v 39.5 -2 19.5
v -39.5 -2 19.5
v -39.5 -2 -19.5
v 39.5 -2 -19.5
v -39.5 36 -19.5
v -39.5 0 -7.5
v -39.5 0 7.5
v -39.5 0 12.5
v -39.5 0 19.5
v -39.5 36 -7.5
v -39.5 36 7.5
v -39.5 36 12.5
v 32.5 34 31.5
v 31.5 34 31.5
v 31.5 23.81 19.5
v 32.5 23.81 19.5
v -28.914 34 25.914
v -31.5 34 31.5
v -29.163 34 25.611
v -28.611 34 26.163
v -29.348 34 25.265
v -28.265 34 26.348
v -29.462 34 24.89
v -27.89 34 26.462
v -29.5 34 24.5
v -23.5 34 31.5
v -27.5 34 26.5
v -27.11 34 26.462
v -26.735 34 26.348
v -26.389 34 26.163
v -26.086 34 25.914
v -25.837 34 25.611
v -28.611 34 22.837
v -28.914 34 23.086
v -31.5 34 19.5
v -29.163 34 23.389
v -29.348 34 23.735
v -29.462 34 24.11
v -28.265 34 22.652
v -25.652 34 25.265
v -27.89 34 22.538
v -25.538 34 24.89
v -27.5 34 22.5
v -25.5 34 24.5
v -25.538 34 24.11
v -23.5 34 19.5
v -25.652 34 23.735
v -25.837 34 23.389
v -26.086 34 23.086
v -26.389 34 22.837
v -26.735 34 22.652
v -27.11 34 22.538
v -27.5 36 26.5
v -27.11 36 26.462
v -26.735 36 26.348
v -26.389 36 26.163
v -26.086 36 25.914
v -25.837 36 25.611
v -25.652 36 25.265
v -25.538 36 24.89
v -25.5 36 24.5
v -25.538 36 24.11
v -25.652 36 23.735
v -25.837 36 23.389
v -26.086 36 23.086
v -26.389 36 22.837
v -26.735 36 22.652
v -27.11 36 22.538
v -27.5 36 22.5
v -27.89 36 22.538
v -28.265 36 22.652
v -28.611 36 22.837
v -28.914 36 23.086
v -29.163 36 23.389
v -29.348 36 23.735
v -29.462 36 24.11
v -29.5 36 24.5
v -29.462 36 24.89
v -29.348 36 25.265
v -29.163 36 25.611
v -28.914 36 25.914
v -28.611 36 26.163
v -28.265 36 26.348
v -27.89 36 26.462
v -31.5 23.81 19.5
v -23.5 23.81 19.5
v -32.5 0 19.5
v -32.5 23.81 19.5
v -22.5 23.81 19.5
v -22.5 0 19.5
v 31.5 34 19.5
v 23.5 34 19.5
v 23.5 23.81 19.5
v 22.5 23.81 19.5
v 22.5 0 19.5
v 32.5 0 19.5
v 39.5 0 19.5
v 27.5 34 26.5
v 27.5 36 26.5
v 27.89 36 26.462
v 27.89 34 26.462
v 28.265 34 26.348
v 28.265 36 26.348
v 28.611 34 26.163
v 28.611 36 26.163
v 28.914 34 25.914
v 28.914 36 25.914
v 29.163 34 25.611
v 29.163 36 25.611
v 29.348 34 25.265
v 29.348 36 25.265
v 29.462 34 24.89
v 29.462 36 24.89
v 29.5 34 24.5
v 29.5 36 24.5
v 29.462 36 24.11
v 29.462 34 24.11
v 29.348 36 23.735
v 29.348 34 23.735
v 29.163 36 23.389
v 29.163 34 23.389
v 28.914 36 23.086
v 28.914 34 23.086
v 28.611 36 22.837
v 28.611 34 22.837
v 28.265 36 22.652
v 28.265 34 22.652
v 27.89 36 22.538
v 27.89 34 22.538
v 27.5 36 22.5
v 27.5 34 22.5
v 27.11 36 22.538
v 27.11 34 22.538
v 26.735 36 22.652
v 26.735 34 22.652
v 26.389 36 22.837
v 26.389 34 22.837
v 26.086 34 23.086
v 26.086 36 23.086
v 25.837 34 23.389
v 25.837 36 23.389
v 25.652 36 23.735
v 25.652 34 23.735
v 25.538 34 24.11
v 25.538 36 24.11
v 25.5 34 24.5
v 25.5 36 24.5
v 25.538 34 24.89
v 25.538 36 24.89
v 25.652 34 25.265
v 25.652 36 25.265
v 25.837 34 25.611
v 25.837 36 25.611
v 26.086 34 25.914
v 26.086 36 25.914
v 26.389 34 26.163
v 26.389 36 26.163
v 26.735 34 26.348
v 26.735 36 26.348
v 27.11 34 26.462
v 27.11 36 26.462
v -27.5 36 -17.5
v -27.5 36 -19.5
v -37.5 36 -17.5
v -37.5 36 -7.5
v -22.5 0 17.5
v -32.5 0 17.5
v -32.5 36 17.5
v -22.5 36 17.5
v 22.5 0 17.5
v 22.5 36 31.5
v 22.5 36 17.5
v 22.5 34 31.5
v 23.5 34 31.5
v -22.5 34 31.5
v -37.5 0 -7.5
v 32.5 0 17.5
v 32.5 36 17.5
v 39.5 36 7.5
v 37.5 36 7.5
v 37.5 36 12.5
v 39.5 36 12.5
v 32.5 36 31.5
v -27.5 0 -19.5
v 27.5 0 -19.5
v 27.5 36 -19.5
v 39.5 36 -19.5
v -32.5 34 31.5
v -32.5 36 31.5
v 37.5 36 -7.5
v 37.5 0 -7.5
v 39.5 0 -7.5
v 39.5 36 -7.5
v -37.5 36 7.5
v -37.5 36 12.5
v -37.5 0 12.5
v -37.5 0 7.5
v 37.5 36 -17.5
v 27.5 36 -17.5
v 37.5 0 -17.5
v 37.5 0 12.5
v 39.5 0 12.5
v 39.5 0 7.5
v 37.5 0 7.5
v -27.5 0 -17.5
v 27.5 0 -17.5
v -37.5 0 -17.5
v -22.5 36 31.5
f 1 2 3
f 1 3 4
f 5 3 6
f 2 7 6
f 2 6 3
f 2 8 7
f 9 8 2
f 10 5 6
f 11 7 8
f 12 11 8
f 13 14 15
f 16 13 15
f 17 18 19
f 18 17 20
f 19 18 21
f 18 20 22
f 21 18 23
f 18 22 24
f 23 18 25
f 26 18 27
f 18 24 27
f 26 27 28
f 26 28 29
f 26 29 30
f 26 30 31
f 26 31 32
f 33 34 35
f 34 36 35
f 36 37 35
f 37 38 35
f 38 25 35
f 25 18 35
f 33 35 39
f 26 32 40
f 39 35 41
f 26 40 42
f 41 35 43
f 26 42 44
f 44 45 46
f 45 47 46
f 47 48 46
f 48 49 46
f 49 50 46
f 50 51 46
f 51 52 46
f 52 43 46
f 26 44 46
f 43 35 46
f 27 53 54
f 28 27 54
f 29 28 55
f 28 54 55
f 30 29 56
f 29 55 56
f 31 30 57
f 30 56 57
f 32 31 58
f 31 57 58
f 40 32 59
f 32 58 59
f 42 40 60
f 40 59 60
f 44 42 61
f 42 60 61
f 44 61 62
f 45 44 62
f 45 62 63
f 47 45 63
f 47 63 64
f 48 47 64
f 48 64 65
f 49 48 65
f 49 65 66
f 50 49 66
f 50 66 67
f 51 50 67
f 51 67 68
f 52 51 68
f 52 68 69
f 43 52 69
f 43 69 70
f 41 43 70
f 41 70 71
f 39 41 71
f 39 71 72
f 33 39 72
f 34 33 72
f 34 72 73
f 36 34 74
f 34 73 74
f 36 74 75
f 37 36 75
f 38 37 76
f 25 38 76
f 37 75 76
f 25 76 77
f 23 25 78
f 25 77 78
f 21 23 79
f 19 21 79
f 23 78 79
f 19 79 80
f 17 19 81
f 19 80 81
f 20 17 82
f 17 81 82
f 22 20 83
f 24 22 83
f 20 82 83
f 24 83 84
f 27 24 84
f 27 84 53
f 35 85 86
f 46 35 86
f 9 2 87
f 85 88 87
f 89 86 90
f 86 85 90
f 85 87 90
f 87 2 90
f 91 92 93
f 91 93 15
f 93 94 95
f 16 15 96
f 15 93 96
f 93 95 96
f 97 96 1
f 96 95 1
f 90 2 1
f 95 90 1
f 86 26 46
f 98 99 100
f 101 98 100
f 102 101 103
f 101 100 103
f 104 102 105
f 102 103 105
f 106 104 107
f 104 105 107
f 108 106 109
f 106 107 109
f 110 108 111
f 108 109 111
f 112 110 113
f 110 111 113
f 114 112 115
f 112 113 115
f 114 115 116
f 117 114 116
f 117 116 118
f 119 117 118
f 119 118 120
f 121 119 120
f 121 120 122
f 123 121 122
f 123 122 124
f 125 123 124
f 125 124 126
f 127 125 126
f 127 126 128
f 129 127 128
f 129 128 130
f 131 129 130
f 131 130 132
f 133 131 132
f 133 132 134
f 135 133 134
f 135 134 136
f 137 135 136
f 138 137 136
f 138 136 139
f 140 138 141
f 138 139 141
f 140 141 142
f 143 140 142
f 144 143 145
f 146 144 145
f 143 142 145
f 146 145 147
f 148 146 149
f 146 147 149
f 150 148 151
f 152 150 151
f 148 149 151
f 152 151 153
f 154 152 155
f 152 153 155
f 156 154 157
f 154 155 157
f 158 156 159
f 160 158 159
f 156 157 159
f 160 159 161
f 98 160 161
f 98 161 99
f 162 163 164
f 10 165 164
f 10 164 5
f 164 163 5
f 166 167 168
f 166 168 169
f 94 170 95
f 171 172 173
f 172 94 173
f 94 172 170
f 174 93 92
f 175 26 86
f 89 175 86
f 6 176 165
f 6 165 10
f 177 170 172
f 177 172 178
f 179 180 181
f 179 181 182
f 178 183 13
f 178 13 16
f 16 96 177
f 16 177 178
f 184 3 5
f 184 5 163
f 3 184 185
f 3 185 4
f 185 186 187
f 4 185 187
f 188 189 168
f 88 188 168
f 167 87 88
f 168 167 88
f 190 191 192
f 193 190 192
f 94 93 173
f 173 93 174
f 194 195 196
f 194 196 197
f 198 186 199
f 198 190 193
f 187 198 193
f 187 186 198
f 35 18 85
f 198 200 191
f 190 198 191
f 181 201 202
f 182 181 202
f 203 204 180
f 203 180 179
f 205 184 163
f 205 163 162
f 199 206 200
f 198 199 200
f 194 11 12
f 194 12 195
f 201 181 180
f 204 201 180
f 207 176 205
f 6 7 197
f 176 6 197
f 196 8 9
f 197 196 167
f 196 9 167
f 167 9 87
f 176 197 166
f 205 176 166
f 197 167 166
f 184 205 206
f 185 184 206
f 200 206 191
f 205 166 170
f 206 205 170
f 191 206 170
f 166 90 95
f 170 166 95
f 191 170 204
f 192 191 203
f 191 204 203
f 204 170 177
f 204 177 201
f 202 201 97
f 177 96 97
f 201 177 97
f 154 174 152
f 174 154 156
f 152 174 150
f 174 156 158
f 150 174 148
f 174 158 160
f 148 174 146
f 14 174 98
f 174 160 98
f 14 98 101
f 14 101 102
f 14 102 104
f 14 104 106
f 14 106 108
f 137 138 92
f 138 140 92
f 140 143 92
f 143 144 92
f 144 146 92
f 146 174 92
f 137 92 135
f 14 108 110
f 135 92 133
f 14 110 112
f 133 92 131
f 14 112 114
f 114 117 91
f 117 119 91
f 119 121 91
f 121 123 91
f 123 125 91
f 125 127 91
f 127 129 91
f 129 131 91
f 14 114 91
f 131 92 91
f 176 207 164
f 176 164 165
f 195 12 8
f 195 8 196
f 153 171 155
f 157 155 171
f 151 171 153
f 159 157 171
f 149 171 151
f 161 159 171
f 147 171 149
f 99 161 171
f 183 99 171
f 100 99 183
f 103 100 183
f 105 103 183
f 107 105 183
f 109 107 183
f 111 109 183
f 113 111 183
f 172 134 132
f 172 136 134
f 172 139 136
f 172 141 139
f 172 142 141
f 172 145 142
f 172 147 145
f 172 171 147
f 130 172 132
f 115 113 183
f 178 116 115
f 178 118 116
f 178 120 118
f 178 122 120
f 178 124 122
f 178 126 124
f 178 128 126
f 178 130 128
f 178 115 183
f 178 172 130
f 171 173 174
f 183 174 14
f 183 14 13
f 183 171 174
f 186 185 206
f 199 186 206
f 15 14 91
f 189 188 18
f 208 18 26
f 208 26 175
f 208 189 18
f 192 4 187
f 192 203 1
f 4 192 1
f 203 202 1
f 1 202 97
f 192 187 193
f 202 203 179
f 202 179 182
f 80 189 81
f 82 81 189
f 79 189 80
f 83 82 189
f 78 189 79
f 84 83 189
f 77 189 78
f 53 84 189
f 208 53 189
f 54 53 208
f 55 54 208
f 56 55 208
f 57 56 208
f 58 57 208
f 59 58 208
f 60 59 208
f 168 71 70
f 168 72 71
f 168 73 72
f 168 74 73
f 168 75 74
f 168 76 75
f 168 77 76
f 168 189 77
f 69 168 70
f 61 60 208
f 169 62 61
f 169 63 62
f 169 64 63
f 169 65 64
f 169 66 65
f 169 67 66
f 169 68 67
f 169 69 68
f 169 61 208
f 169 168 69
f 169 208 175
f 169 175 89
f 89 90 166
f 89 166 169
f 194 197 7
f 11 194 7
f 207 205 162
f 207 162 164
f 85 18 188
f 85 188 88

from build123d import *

# Parameters (mm, degrees)
CROQUIS1_W                = 5
CROQUIS1_H                = 2
SALIENTE_EXTRUIR1_DEPTH   = 36
CROQUIS1_W_2              = 2
CROQUIS1_H_2              = 5
SALIENTE_EXTRUIR1_2_DEPTH = 36
SALIENTE_EXTRUIR1_3_DEPTH = 36
SALIENTE_EXTRUIR1_4_DEPTH = 36
SALIENTE_EXTRUIR1_5_DEPTH = 36
CROQUIS2_W                = 79
CROQUIS2_H                = 39
SALIENTE_EXTRUIR2_DEPTH   = 2
CORTAR_EXTRUIR1_DEPTH     = 36
CROQUIS4_W                = 5
CROQUIS4_H                = 2
SALIENTE_EXTRUIR3_DEPTH   = 36
CROQUIS5_W                = 10
CROQUIS5_H                = 2
SALIENTE_EXTRUIR4_DEPTH   = 12
NERVIO1_REACH             = 88.442
CROQUIS8_WALL_W           = 190.62700295
CROQUIS8_WALL_H           = 1
NERVIO2_REACH             = 80.309
CROQUIS9_WALL_W           = 174.36001667
CROQUIS9_WALL_H           = 1
NERVIO3_REACH             = 88.442
CROQUIS10_WALL_W          = 190.62700295
CROQUIS10_WALL_H          = 1
NERVIO4_REACH             = 80.309
CROQUIS11_WALL_W          = 174.36001667
CROQUIS11_WALL_H          = 1
CROQUIS12_R               = 2
CORTAR_EXTRUIR2_DEPTH     = 64.217877218


with BuildPart() as part:
    # Croquis1 → Saliente-Extruir1 (new body)
    with BuildSketch(Plane(origin=(0, 0, 0), x_dir=(1, 0, 0), z_dir=(0, 1, 0))):
        with Locations((30, -18.5)):
            Rectangle(CROQUIS1_W, CROQUIS1_H)
    extrude(amount=SALIENTE_EXTRUIR1_DEPTH)



with BuildPart() as body_2:
    # Croquis1 → Saliente-Extruir1 2 (new body)
    with BuildSketch(Plane(origin=(0, 0, 0), x_dir=(1, 0, 0), z_dir=(0, 1, 0))):
        with Locations((38.5, -10)):
            Rectangle(CROQUIS1_W_2, CROQUIS1_H_2)
    extrude(amount=SALIENTE_EXTRUIR1_2_DEPTH)


with BuildPart() as body_3:
    # Croquis1 → Saliente-Extruir1 3 (new body)
    with BuildSketch(Plane(origin=(0, 0, 0), x_dir=(1, 0, 0), z_dir=(0, 1, 0))):
        Polygon((39.5, 19.5), (27.5, 19.5), (27.5, 17.5), (37.5, 17.5), (37.5, 7.5), (39.5, 7.5), align=None)
    extrude(amount=SALIENTE_EXTRUIR1_3_DEPTH)


with BuildPart() as body_4:
    # Croquis1 → Saliente-Extruir1 4 (new body)
    with BuildSketch(Plane(origin=(0, 0, 0), x_dir=(1, 0, 0), z_dir=(0, 1, 0))):
        Polygon((-39.5, 7.5), (-39.5, 19.5), (-27.5, 19.5), (-27.5, 17.5), (-37.5, 17.5), (-37.5, 7.5), align=None)
    extrude(amount=SALIENTE_EXTRUIR1_4_DEPTH)


with BuildPart() as body_5:
    # Croquis1 → Saliente-Extruir1 5 (new body)
    with BuildSketch(Plane(origin=(0, 0, 0), x_dir=(1, 0, 0), z_dir=(0, 1, 0))):
        Polygon((-39.5, -7.5), (-39.5, -19.5), (-27.5, -19.5), (-27.5, -17.5), (-37.5, -17.5), (-37.5, -7.5), align=None)
    extrude(amount=SALIENTE_EXTRUIR1_5_DEPTH)


with BuildPart() as part_1:
    add(part.part)

    add(body_2.part)  # Saliente-Extruir2 merges body 2

    add(body_3.part)  # Saliente-Extruir2 merges body 3

    add(body_4.part)  # Saliente-Extruir2 merges body 4

    add(body_5.part)  # Saliente-Extruir2 merges body 5
    # Croquis2 → Saliente-Extruir2 (add)
    with BuildSketch(Plane.XZ):
        Rectangle(CROQUIS2_W, CROQUIS2_H)
    extrude(amount=SALIENTE_EXTRUIR2_DEPTH)

    # Croquis3 → Cortar-Extruir1 (cut)
    with BuildSketch(Plane(origin=(0, 36, 0), x_dir=(1, 0, 0), z_dir=(0, 1, 0))):
        Polygon((-32.5, -17.5), (-32.5, -19.5), (-39.5, -19.5), (-39.5, -12.5), (-37.5, -12.5), (-37.5, -17.5), align=None)
    extrude(amount=-CORTAR_EXTRUIR1_DEPTH, mode=Mode.SUBTRACT)

    # Croquis4 → Saliente-Extruir3 (add)
    with BuildSketch(Plane(origin=(0, 0, 0), x_dir=(1, 0, 0), z_dir=(0, 1, 0))):
        with Locations((-25, -18.5)):
            Rectangle(CROQUIS4_W, CROQUIS4_H)
        with Locations((25, -18.5)):
            Rectangle(CROQUIS4_W, CROQUIS4_H)
    extrude(amount=SALIENTE_EXTRUIR3_DEPTH)

    # Croquis5 → Saliente-Extruir4 (add)
    with BuildSketch(Plane.XY.offset(19.5)):
        with Locations((-27.5, 35)):
            Rectangle(CROQUIS5_W, CROQUIS5_H)
        with Locations((27.5, 35)):
            Rectangle(CROQUIS5_W, CROQUIS5_H)
    extrude(amount=SALIENTE_EXTRUIR4_DEPTH)

    # Croquis8 wall → Nervio1 (add, up to next)
    with BuildSketch(Plane(origin=(-32.5, 28.90512554, 25.5), x_dir=(0, -0.647270304875, -0.762260554159), z_dir=(0, -0.762260554159, 0.647270304875)), mode=Mode.PRIVATE) as nervio1_sk1:
        with Locations((0, 0.5)):
            Rectangle(CROQUIS8_WALL_W, CROQUIS8_WALL_H)
    nervio1_tool1 = extrude(nervio1_sk1.sketch, amount=-NERVIO1_REACH, mode=Mode.PRIVATE) - part_1.part
    add(nervio1_tool1.solids().sort_by_distance((-32.5, 28.90512554, 25.5))[0])

    # Croquis9 wall → Nervio2 (add, up to next)
    with BuildSketch(Plane(origin=(-22.5, 28.90512554, 25.5), x_dir=(0, -0.647270304875, -0.762260554159), z_dir=(0, 0.762260554159, -0.647270304875)), mode=Mode.PRIVATE) as nervio2_sk1:
        with Locations((0, 0.5)):
            Rectangle(CROQUIS9_WALL_W, CROQUIS9_WALL_H)
    nervio2_tool1 = extrude(nervio2_sk1.sketch, amount=NERVIO2_REACH, mode=Mode.PRIVATE) - part_1.part
    add(nervio2_tool1.solids().sort_by_distance((-22.5, 28.90512554, 25.5))[0])

    # Croquis10 wall → Nervio3 (add, up to next)
    with BuildSketch(Plane(origin=(32.5, 28.90512554, 25.5), x_dir=(0, -0.647270304875, -0.762260554159), z_dir=(0, 0.762260554159, -0.647270304875)), mode=Mode.PRIVATE) as nervio3_sk1:
        with Locations((0, 0.5)):
            Rectangle(CROQUIS10_WALL_W, CROQUIS10_WALL_H)
    nervio3_tool1 = extrude(nervio3_sk1.sketch, amount=NERVIO3_REACH, mode=Mode.PRIVATE) - part_1.part
    add(nervio3_tool1.solids().sort_by_distance((32.5, 28.90512554, 25.5))[0])

    # Croquis11 wall → Nervio4 (add, up to next)
    with BuildSketch(Plane(origin=(22.5, 28.90512554, 25.5), x_dir=(0, 0.647270304875, 0.762260554159), z_dir=(0, 0.762260554159, -0.647270304875)), mode=Mode.PRIVATE) as nervio4_sk1:
        with Locations((0, 0.5)):
            Rectangle(CROQUIS11_WALL_W, CROQUIS11_WALL_H)
    nervio4_tool1 = extrude(nervio4_sk1.sketch, amount=NERVIO4_REACH, mode=Mode.PRIVATE) - part_1.part
    add(nervio4_tool1.solids().sort_by_distance((22.5, 28.90512554, 25.5))[0])

    # Croquis12 → Cortar-Extruir2 (cut, through all)
    with BuildSketch(Plane(origin=(0, 36, 0), x_dir=(1, 0, 0), z_dir=(0, 1, 0))):
        with Locations(Location((27.5, -24.5, 0), (0, 0, 270))):
            Circle(CROQUIS12_R)
        with Locations(Location((-27.5, -24.5, 0), (0, 0, 270))):
            Circle(CROQUIS12_R)
    extrude(amount=-CORTAR_EXTRUIR2_DEPTH, mode=Mode.SUBTRACT)


solid = part_1.part
